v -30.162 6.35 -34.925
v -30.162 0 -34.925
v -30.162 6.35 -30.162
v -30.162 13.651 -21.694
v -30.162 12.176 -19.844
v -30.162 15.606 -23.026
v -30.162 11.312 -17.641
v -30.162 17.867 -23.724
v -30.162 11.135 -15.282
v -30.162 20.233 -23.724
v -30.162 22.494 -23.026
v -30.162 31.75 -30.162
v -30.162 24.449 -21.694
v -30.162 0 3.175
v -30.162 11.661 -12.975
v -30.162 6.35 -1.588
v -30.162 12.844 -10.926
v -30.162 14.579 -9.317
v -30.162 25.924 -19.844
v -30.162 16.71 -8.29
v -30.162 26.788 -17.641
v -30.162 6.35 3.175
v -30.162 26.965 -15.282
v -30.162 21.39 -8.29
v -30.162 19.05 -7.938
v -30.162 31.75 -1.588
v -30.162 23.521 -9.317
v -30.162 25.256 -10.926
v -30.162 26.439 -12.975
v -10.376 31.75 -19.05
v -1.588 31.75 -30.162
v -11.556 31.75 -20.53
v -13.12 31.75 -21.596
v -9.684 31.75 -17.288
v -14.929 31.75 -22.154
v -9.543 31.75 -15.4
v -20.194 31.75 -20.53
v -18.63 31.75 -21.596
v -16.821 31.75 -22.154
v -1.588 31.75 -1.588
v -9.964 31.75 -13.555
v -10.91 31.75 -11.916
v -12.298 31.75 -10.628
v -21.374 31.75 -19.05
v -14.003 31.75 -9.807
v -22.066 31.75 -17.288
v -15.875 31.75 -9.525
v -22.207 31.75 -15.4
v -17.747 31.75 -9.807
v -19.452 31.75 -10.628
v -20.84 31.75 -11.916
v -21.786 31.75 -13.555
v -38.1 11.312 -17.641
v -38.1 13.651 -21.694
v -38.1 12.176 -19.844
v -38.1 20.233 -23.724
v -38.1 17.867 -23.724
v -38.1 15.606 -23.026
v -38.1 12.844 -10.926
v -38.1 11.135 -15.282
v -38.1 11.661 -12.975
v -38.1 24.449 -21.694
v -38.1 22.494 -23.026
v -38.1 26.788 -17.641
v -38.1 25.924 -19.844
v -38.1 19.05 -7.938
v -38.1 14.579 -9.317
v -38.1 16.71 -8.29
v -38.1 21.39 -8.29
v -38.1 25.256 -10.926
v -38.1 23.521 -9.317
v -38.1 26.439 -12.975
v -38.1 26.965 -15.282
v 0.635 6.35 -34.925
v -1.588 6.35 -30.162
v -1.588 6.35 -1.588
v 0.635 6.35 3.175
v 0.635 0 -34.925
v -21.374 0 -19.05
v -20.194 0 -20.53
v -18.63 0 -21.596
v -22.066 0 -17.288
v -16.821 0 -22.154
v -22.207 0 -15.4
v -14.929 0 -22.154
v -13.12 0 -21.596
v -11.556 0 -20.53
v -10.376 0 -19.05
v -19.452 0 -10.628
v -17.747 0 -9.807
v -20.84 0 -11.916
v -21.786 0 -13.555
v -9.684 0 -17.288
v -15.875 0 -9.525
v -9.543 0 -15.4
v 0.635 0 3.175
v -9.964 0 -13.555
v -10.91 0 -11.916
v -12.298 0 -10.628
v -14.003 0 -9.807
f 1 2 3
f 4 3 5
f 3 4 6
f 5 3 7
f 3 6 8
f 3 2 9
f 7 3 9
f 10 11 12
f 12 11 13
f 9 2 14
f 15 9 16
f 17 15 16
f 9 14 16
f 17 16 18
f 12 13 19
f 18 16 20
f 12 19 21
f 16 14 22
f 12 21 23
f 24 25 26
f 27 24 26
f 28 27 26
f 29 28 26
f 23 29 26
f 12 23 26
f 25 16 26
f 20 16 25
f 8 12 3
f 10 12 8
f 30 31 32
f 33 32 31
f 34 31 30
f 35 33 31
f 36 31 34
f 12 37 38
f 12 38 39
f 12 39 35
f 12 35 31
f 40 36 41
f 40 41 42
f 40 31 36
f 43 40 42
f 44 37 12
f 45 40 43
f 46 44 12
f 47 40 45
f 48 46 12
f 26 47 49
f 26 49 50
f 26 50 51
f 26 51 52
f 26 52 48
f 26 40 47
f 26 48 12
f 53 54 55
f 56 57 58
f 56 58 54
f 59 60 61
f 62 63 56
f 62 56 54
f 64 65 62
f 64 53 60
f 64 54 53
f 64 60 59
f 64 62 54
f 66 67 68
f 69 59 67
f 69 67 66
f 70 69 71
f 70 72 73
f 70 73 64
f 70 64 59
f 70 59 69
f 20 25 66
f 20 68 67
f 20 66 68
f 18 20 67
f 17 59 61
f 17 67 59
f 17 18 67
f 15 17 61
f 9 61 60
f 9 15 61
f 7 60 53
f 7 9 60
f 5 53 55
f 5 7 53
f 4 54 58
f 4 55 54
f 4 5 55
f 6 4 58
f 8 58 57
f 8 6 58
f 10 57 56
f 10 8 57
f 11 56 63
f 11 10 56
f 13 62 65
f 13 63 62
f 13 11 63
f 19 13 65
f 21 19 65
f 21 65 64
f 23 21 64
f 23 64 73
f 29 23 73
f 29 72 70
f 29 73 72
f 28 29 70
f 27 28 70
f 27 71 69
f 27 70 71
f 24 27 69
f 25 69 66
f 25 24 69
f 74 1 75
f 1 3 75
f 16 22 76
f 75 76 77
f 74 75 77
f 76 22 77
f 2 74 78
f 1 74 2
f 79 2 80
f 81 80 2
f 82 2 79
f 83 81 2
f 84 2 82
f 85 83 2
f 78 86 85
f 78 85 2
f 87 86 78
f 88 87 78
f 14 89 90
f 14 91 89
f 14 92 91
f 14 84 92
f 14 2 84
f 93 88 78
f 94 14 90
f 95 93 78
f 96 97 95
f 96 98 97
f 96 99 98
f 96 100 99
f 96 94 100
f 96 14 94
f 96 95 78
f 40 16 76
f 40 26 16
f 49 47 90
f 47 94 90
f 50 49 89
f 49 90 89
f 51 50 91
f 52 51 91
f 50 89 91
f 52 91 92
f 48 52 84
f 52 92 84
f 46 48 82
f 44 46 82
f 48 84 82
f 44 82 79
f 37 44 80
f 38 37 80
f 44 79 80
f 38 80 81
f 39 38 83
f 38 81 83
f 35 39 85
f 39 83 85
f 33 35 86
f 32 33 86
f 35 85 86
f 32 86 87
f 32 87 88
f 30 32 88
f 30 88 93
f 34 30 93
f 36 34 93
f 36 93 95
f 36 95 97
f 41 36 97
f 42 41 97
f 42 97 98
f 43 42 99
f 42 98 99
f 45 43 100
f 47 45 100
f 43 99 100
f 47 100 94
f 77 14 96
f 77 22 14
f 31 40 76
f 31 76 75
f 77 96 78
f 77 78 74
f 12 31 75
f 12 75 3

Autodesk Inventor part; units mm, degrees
ref_plane "YZ Plane" through (0, 0, 0) normal (1, 0, 0) x (0, 1, 0)
ref_plane "XZ Plane" through (0, 0, 0) normal (0, 1, 0) x (-1, 0, 0)
ref_plane "XY Plane" through (0, 0, 0) normal (0, 0, 1) x (1, 0, 0)
sketch "Sketch1" plane through (0, 0, 0) normal (0, 1, 0) x (-1, 0, 0)
  line L0 (0, 0) -> (30.1625, 0)
  line L1 (30.1625, 0) -> (30.1625, -31.75)
  line L2 (30.1625, -31.75) -> (0, -31.75)
  line L3 (0, -31.75) -> (0, 0)
  dimension "d0" = 31.75
  dimension "d1" = 30.1625
extrude "Extrusion1" add sketch "Sketch1" along normal blind 31.75
sketch "Sketch2" plane through (-30.1625, 0, 0) normal (0, 0, 1) x (1, 0, 0)
  line L0 (0, 0) -> (0, 31.75) projected
  line L1 (30.1625, 0) -> (30.1625, 31.75) projected
  line L2 (30.1625, 0) -> (0, 0) projected
  line L3 (0, 6.35) -> (30.1625, 6.35)
  line L4 (30.1625, 6.35) -> (30.1625, 31.75)
  line L5 (30.1625, 31.75) -> (0, 31.75)
  line L6 (0, 31.75) -> (0, 6.35)
  dimension "d5" = 6.35
extrude "Extrusion2" cut sketch "Sketch2" against normal blind 1.5875 contours L0 L5 L1 L3
sketch "Sketch3" plane through (0, 0, 0) normal (1, 0, 0) x (0, 0, -1)
  line L0 (1.5875, 31.75) -> (1.5875, 6.35) projected
  line L1 (31.75, 0) -> (31.75, 31.75) projected
  line L2 (1.5875, 6.35) -> (31.75, 6.35)
  line L3 (31.75, 6.35) -> (31.75, 31.75)
  line L4 (31.75, 31.75) -> (1.5875, 31.75)
  line L5 (1.5875, 31.75) -> (1.5875, 6.35)
  point P0 (0, 0)
extrude "Extrusion3" cut sketch "Sketch3" against normal blind 1.5875
sketch "Sketch4" plane through (0, 0, -31.75) normal (0, 0, -1) x (-1, 0, 0)
  line L0 (0, 6.35) -> (30.1625, 6.35) projected
  line L1 (30.1625, 6.35) -> (30.1625, 31.75) projected
  line L2 (1.5875, 6.35) -> (30.1625, 6.35)
  line L3 (30.1625, 6.35) -> (30.1625, 31.75)
  line L4 (30.1625, 31.75) -> (1.5875, 31.75)
  line L5 (1.5875, 31.75) -> (1.5875, 6.35)
  line L6 (1.5875, 31.75) -> (1.5875, 6.35) projected
  point P0 (0, 0)
  dimension "d10" = 0
extrude "Extrusion4" cut sketch "Sketch4" against normal blind 1.5875
sketch "Sketch9" plane through (0, 31.75, 0) normal (0, 1, 0) x (1, 0, 0)
  line L0 (0, 31.75) -> (0, 0) projected
  line L1 (-30.1625, 31.75) -> (0, 31.75) projected
  point P0 (-15.875, 15.875)
  dimension "d23" = 15.875
  dimension "d24" = 15.875
hole "Hole1" at (-15.875, 31.75, -15.875) direction (0, -1, 0) diameter 12.7 end through all
sketch "Sketch10" plane through (-30.1625, 0, -31.75) normal (-1, 0, 0) x (0, 0, 1)
  circle A0 centre (15.875, 19.05) radius 7.9375
  line L0 (31.75, 0) -> (31.75, 6.35) projected
  line L1 (1.5875, 31.75) -> (30.1625, 31.75) projected
  line L2 (30.1625, 6.35) -> (30.1625, 31.75) projected
  dimension "d33" = 15.875
  dimension "d34" = 15.875
extrude "Extrusion6" add sketch "Sketch10" along normal blind 7.9375
sketch "Sketch12" plane through (0, 0, 0) normal (1, 0, 0) x (0, 0, -1)
  line L0 (31.75, 6.35) -> (0, 6.35) projected
  line L1 (0, 0) -> (0, 6.35) projected
  line L2 (31.75, 0) -> (0, 0) projected
  line L3 (31.75, 0) -> (31.75, 6.35) projected
extrude "Extrusion8" add sketch "Sketch12" along normal blind 0.635
sketch "Sketch13" plane through (-30.1625, 0, 0) normal (0, 0, 1) x (1, 0, 0)
  line L0 (0, 6.35) -> (30.7975, 6.35) projected
  line L1 (0, 0) -> (0, 6.35) projected
  line L2 (30.7975, 0) -> (0, 0) projected
  line L3 (30.7975, 6.35) -> (30.7975, 0) projected
  point P0 (30.1625, 0)
extrude "Extrusion9" add sketch "Sketch13" along normal blind 3.175
sketch "Sketch14" plane through (-30.1625, 0, -31.75) normal (0, 0, -1) x (-1, 0, 0)
  line L0 (0, 6.35) -> (-30.7975, 6.35) projected
  line L1 (-30.7975, 0) -> (-30.7975, 6.35) projected
  line L2 (0, 0) -> (-30.7975, 0) projected
  line L3 (0, 0) -> (0, 6.35) projected
  point P0 (-30.1625, 0)
extrude "Extrusion10" add sketch "Sketch14" along normal blind 3.175
equation "\"d24\" = d23"
properties part number "WackyPlug"
